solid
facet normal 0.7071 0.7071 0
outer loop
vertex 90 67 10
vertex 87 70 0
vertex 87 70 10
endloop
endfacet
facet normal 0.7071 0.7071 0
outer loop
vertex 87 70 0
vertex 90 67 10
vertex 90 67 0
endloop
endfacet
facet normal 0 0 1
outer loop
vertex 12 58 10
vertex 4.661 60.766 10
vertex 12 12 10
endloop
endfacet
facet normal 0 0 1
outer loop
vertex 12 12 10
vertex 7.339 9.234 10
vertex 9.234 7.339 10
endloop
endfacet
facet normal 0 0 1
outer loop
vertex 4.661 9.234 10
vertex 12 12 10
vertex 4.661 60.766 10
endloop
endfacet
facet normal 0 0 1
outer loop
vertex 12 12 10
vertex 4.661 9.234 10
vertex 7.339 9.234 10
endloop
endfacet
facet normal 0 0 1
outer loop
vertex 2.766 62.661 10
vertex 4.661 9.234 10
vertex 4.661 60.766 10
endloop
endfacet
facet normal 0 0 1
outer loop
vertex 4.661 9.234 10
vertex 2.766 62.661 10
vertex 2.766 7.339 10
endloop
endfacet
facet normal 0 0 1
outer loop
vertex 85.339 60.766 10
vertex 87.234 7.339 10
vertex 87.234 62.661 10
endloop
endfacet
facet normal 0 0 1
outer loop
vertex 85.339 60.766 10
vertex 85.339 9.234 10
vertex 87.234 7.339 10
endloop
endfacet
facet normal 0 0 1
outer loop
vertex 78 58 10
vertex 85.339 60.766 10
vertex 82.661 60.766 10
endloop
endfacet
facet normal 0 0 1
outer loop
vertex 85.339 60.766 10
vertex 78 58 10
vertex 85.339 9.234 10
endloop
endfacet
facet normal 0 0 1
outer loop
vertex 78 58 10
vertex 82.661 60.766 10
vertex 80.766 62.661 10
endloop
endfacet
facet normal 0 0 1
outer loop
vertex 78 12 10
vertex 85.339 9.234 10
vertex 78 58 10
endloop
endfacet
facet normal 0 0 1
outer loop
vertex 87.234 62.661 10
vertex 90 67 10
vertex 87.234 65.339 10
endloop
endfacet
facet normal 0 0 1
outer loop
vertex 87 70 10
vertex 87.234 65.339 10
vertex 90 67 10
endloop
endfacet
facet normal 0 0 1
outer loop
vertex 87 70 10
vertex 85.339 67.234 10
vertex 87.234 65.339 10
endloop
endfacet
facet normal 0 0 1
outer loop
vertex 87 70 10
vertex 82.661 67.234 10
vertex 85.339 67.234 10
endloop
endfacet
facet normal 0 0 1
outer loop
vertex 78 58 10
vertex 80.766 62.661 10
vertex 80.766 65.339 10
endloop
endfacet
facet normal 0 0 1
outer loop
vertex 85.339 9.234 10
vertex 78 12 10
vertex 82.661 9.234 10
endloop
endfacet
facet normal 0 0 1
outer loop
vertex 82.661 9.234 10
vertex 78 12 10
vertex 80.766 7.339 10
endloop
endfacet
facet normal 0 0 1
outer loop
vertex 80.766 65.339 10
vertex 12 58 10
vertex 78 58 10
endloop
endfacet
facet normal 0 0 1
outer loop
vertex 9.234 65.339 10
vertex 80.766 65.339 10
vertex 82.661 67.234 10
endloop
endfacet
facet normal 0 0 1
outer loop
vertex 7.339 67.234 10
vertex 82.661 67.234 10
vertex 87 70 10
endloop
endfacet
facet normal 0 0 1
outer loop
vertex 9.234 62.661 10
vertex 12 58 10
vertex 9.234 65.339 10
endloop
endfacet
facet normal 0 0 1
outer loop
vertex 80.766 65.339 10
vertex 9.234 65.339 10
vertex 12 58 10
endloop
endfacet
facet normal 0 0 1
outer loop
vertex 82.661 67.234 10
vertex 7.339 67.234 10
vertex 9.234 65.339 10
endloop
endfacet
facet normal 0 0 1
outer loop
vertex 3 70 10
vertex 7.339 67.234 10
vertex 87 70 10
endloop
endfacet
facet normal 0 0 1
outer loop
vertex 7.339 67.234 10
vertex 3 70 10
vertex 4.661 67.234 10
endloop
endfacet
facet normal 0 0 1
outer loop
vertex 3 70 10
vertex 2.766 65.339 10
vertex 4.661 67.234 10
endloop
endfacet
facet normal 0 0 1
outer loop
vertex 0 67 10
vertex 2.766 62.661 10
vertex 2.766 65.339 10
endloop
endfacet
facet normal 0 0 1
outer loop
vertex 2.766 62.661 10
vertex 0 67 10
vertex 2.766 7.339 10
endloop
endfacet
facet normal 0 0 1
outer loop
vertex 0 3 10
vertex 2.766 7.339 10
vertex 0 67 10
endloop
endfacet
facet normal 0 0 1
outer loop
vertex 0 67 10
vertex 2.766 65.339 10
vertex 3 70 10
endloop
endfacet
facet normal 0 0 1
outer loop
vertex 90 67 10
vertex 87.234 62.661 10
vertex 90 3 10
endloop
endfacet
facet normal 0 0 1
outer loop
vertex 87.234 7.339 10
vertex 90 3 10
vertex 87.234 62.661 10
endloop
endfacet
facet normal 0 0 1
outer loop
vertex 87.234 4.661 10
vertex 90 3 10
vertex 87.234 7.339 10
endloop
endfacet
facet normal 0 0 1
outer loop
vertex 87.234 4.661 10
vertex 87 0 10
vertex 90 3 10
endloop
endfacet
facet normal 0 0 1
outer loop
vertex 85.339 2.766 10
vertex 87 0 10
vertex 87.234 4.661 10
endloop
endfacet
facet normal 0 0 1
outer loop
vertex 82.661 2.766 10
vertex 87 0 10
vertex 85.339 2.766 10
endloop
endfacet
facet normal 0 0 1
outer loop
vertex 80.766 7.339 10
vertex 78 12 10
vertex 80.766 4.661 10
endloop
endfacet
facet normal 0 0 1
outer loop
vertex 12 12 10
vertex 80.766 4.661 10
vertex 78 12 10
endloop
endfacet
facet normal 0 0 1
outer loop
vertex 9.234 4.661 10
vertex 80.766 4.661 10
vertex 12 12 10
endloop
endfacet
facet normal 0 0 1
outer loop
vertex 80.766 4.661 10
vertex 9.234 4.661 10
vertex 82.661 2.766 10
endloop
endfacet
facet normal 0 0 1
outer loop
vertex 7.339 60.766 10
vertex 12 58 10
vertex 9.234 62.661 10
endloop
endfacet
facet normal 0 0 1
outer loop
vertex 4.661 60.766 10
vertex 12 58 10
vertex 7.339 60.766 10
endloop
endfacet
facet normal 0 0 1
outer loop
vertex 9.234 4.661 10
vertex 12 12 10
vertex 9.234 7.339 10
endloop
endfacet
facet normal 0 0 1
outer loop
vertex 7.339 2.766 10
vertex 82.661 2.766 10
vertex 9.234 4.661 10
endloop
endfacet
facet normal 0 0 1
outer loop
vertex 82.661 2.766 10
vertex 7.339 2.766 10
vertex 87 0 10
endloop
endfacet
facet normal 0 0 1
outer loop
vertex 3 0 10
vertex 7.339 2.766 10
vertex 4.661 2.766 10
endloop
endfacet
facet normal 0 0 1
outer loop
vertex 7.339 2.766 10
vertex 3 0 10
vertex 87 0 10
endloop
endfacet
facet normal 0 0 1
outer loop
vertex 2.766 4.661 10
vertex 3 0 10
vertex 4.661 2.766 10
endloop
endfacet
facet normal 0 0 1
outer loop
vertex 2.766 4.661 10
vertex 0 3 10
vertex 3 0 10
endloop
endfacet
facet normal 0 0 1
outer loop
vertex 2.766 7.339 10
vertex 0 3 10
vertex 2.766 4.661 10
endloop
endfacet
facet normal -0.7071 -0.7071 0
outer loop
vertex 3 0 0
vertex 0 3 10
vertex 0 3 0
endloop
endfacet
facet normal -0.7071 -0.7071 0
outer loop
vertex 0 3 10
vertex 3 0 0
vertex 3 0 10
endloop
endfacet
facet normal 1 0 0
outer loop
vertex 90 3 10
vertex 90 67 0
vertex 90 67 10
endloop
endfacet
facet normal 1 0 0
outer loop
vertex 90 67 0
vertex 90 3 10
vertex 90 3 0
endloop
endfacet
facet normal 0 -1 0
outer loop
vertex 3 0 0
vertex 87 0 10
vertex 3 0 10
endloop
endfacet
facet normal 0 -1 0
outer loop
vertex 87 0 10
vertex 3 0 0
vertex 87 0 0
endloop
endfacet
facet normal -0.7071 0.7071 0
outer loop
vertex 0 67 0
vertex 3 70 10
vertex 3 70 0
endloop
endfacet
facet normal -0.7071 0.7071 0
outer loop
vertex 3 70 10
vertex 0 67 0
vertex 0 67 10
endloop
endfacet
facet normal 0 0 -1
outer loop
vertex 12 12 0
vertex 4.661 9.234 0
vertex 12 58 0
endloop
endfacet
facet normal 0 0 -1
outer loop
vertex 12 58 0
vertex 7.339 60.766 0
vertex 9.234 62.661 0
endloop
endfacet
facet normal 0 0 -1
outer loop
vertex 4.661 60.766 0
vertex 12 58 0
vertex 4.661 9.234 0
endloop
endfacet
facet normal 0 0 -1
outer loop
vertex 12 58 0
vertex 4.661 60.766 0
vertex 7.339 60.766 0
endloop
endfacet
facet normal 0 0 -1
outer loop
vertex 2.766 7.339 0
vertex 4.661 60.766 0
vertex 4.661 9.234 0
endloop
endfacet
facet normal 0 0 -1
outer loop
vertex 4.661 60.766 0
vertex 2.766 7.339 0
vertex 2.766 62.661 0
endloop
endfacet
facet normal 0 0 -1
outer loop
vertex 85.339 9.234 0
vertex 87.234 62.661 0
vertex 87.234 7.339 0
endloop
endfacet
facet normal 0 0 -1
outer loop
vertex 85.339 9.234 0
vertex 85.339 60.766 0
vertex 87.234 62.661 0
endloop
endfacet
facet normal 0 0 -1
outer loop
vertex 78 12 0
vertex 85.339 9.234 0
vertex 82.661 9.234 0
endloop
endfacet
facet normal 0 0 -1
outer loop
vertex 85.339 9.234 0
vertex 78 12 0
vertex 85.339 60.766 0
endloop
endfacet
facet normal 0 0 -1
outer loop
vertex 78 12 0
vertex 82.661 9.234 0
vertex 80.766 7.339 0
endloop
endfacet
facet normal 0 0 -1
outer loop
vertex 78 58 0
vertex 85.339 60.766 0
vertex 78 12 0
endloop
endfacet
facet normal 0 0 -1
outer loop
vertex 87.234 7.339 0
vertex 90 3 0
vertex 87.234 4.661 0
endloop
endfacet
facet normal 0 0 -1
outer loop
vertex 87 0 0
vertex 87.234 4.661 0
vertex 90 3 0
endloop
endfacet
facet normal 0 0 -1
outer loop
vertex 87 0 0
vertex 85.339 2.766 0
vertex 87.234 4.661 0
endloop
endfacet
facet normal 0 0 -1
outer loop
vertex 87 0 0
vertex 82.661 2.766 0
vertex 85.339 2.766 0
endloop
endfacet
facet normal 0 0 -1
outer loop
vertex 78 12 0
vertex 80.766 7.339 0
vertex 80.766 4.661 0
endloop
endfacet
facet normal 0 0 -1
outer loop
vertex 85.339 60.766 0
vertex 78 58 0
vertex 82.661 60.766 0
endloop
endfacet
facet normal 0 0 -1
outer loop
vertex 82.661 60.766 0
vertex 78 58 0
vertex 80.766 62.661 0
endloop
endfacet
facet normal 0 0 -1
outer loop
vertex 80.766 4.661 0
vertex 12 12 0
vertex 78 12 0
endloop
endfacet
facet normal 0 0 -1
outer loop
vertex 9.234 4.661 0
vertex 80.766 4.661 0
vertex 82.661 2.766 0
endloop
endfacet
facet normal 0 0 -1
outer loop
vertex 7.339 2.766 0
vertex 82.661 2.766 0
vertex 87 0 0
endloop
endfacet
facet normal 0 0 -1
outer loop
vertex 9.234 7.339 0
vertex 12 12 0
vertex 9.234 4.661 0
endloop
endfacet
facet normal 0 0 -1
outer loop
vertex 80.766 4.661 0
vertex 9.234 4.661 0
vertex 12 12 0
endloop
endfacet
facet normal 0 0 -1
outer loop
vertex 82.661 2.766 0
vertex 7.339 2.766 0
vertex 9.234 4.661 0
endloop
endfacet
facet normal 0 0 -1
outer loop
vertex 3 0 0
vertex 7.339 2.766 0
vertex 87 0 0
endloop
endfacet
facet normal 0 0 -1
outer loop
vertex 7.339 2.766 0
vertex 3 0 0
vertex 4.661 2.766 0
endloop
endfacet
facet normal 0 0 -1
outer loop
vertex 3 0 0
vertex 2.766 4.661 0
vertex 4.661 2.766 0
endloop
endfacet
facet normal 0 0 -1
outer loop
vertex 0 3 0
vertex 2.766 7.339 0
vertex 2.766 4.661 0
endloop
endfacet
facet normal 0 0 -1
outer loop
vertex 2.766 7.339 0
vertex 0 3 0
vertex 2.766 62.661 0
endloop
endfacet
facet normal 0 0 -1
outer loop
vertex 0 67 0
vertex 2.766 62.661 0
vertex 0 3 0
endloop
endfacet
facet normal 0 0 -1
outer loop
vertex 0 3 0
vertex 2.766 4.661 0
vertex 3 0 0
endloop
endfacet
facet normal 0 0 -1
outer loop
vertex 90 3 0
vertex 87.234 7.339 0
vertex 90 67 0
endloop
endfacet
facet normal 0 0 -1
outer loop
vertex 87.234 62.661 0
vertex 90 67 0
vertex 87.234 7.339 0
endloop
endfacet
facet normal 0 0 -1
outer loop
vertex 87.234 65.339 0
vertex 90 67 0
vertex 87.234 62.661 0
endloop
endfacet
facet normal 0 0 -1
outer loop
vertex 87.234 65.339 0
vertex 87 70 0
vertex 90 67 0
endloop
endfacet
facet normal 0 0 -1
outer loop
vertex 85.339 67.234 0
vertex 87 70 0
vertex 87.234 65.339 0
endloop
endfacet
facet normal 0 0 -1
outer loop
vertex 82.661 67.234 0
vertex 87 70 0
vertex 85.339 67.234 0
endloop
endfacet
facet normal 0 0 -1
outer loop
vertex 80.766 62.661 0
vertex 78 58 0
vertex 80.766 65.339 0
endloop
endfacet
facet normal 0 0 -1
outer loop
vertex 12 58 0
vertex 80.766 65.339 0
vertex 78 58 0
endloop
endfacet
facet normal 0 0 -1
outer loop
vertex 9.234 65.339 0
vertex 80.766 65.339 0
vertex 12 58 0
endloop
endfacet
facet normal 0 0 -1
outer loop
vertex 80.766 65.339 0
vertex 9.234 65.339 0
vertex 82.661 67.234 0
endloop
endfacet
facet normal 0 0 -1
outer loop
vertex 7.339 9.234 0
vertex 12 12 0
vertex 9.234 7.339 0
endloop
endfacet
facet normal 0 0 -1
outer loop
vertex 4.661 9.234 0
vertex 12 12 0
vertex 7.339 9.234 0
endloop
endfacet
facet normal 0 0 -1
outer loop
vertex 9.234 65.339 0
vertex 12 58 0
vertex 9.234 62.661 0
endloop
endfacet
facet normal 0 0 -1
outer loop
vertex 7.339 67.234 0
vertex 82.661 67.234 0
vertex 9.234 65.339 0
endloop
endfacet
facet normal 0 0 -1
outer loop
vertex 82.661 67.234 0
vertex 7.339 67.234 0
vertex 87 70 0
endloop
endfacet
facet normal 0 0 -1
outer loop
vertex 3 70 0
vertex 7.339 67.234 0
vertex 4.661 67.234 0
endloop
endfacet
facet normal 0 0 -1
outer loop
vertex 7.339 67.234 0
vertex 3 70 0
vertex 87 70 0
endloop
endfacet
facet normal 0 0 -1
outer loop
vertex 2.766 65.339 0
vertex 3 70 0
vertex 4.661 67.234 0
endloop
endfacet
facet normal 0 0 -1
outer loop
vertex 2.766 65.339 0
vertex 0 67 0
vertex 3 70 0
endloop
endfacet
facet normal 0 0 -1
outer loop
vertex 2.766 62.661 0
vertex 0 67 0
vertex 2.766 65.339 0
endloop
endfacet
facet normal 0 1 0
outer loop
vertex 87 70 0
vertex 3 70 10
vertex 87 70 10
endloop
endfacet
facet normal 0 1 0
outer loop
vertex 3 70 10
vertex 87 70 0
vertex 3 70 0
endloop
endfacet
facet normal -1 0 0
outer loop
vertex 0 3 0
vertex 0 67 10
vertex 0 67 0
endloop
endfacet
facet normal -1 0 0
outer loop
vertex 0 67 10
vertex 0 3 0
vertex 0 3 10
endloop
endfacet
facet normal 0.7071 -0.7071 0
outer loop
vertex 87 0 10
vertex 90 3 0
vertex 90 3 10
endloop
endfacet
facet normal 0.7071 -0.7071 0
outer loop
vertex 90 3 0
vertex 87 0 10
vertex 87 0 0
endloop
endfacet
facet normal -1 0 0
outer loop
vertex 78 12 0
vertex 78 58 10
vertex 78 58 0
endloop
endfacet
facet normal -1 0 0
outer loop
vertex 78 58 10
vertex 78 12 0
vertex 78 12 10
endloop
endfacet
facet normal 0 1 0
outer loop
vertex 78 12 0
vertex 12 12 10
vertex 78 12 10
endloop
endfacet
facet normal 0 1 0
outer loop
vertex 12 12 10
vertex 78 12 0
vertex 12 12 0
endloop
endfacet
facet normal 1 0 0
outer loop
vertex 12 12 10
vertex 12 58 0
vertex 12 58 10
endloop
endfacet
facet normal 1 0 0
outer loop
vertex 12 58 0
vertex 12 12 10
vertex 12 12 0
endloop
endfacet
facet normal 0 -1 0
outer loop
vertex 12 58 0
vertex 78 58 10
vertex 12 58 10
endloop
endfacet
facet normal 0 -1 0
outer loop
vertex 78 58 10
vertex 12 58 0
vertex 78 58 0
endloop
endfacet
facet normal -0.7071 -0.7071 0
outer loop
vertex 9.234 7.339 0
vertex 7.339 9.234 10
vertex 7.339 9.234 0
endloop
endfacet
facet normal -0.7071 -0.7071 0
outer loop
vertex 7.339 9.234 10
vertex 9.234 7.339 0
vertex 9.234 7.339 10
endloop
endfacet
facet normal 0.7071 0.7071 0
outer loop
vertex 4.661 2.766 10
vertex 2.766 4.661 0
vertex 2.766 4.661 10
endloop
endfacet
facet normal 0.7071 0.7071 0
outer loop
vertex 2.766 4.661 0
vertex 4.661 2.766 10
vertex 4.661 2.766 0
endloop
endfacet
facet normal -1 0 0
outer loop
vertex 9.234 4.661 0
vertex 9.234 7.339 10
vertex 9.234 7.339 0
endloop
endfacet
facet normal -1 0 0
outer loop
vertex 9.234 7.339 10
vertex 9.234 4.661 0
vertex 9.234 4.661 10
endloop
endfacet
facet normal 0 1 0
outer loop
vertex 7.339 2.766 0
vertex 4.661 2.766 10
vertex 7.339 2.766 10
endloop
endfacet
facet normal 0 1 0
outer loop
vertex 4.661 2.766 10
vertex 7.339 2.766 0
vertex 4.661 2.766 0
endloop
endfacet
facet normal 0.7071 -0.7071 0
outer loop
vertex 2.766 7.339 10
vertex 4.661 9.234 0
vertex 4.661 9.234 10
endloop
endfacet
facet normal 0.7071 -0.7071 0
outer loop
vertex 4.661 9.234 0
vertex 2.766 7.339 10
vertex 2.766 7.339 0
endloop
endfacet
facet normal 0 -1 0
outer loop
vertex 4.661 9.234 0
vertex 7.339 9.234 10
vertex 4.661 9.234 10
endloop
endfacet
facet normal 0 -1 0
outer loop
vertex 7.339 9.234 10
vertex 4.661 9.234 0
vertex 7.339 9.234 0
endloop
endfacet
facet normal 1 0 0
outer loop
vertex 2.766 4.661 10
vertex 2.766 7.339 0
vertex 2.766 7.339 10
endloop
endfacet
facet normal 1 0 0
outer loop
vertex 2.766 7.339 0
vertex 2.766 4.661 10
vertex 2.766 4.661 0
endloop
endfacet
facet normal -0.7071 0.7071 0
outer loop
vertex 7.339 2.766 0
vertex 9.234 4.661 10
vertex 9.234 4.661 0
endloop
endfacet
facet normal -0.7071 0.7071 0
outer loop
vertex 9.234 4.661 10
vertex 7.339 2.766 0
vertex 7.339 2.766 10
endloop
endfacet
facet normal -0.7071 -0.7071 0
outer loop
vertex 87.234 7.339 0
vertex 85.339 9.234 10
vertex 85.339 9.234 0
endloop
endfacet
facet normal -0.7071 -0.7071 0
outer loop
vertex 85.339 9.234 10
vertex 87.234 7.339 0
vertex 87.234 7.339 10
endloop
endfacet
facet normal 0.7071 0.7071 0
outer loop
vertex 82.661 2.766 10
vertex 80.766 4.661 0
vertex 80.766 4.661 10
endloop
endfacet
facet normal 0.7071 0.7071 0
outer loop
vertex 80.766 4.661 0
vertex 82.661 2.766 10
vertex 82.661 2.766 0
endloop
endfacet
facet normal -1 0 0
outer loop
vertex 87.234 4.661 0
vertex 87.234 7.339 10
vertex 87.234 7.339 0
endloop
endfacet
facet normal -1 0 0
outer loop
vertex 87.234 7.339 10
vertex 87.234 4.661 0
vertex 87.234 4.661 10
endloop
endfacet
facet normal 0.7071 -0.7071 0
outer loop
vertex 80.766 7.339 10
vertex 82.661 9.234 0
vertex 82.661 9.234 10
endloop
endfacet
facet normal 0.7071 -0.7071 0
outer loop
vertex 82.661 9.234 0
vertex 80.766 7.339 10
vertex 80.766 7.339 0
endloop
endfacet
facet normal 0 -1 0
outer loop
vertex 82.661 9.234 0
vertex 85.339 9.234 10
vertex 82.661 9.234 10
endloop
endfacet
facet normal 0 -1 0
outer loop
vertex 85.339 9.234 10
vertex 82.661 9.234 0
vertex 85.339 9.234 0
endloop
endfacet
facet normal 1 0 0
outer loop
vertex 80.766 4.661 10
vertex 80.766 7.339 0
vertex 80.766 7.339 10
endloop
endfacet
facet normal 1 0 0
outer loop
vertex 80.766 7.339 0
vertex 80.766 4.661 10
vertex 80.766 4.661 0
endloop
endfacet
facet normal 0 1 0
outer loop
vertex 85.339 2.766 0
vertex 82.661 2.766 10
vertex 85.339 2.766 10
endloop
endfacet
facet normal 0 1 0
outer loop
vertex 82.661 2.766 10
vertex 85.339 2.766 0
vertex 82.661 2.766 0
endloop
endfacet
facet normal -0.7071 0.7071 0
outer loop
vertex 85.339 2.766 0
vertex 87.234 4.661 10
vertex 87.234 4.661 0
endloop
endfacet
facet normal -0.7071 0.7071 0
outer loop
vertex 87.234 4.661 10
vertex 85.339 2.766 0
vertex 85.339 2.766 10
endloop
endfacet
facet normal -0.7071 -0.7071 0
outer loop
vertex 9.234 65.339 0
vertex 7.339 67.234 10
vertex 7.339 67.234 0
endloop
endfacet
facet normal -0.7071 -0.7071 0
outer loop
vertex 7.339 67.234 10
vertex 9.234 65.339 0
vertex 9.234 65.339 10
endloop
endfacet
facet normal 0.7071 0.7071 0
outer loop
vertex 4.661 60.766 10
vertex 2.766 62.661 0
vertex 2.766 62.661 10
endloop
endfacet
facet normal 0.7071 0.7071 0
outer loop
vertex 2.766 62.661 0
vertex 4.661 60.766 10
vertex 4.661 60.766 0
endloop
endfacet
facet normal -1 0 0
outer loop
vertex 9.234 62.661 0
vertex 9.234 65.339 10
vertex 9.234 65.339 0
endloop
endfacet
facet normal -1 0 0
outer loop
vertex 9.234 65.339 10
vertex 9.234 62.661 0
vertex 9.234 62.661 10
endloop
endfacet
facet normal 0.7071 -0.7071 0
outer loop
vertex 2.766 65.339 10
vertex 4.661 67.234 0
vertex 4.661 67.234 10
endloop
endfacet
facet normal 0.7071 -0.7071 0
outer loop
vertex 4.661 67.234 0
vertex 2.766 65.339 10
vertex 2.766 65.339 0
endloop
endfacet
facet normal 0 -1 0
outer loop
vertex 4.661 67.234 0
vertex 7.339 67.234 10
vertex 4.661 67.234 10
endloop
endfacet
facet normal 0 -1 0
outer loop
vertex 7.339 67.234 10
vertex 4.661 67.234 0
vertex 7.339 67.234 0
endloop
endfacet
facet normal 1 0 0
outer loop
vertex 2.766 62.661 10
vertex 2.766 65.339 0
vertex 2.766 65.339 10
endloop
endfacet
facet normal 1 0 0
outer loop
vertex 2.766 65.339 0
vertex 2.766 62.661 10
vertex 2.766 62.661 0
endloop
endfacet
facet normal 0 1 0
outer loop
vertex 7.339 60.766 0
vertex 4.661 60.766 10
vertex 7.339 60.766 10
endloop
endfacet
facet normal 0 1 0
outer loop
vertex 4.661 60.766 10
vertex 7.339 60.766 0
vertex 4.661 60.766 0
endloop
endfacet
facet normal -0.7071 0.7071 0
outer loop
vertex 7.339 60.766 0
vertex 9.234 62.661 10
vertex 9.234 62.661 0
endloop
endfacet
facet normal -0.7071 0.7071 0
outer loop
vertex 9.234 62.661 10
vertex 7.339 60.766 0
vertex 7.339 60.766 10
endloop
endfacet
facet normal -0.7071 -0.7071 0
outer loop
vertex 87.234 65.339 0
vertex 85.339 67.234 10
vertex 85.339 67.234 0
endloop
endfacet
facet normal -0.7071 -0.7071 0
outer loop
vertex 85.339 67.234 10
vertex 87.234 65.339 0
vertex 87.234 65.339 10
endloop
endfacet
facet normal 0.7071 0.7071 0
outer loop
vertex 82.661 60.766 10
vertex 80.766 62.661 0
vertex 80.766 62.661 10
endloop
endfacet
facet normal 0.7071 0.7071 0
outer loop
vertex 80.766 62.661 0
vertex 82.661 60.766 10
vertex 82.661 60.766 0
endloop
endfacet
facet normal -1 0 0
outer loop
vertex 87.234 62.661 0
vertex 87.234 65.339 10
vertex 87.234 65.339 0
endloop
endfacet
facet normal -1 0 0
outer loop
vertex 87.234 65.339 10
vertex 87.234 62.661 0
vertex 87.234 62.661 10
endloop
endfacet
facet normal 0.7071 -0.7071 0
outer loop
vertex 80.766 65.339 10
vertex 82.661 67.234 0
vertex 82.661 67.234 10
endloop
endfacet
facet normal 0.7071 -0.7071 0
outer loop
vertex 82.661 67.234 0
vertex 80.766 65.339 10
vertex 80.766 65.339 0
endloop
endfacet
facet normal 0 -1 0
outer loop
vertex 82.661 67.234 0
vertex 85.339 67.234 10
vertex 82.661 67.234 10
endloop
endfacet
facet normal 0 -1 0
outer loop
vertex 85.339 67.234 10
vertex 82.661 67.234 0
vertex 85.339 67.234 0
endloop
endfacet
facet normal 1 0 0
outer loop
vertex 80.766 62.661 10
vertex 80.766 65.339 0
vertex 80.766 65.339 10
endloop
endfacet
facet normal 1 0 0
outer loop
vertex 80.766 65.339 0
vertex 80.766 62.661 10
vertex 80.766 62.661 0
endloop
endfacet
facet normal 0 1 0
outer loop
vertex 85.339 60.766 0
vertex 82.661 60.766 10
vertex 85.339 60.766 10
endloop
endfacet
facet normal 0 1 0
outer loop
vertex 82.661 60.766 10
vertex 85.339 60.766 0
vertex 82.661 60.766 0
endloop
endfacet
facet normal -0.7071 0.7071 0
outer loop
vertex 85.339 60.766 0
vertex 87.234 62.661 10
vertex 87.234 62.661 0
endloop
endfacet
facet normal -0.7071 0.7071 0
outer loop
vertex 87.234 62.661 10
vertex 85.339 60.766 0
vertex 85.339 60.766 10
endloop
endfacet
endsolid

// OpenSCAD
$fn = 32;

// ----------------------------------------------------------------------
// Frame plate: 90 x 70 frame, 12 mm rails
// ----------------------------------------------------------------------

// --- parameters (mm) ---
plate_l = 90;             // plate length, X
plate_w = 70;             // plate width, Y
plate_t = 10;             // plate thickness, Z (extrusion height)
corner_c = 3;             // corner chamfer
frame_bar = 12;           // frame rail width
bolt_r = 3.5;             // corner bolt window radius
bolt_inset = 6;           // bolt centre inset from the edges

win_l = plate_l - 2 * frame_bar;  // window length
win_w = plate_w - 2 * frame_bar;  // window width
bolt_d = 2 * bolt_r;  // corner hole diameter

profile = [[3, 0], [87, 0], [90, 3], [90, 67], [87, 70], [3, 70], [0, 67], [0, 3]];  // primary outline, 8 points, counter clockwise
void_1 = [[12, 12], [78, 12], [78, 58], [12, 58]];  // the window, 4 points
void_2 = [[9.234, 7.339], [7.339, 9.234], [4.661, 9.234], [2.766, 7.339], [2.766, 4.661], [4.661, 2.766], [7.339, 2.766], [9.234, 4.661]];  // corner bolt window, 8 points
void_3 = [[87.234, 7.339], [85.339, 9.234], [82.661, 9.234], [80.766, 7.339], [80.766, 4.661], [82.661, 2.766], [85.339, 2.766], [87.234, 4.661]];  // corner bolt window, 8 points
void_4 = [[9.234, 65.339], [7.339, 67.234], [4.661, 67.234], [2.766, 65.339], [2.766, 62.661], [4.661, 60.766], [7.339, 60.766], [9.234, 62.661]];  // corner bolt window, 8 points
void_5 = [[87.234, 65.339], [85.339, 67.234], [82.661, 67.234], [80.766, 65.339], [80.766, 62.661], [82.661, 60.766], [85.339, 60.766], [87.234, 62.661]];  // corner bolt window, 8 points

// --- the one profile operation ---
difference() {
  linear_extrude(height = plate_t) polygon(points = profile);
  translate([0, 0, -1])
    linear_extrude(height = plate_t + 2) polygon(points = void_1);
  translate([0, 0, -1])
    linear_extrude(height = plate_t + 2) polygon(points = void_2);
  translate([0, 0, -1])
    linear_extrude(height = plate_t + 2) polygon(points = void_3);
  translate([0, 0, -1])
    linear_extrude(height = plate_t + 2) polygon(points = void_4);
  translate([0, 0, -1])
    linear_extrude(height = plate_t + 2) polygon(points = void_5);
}
